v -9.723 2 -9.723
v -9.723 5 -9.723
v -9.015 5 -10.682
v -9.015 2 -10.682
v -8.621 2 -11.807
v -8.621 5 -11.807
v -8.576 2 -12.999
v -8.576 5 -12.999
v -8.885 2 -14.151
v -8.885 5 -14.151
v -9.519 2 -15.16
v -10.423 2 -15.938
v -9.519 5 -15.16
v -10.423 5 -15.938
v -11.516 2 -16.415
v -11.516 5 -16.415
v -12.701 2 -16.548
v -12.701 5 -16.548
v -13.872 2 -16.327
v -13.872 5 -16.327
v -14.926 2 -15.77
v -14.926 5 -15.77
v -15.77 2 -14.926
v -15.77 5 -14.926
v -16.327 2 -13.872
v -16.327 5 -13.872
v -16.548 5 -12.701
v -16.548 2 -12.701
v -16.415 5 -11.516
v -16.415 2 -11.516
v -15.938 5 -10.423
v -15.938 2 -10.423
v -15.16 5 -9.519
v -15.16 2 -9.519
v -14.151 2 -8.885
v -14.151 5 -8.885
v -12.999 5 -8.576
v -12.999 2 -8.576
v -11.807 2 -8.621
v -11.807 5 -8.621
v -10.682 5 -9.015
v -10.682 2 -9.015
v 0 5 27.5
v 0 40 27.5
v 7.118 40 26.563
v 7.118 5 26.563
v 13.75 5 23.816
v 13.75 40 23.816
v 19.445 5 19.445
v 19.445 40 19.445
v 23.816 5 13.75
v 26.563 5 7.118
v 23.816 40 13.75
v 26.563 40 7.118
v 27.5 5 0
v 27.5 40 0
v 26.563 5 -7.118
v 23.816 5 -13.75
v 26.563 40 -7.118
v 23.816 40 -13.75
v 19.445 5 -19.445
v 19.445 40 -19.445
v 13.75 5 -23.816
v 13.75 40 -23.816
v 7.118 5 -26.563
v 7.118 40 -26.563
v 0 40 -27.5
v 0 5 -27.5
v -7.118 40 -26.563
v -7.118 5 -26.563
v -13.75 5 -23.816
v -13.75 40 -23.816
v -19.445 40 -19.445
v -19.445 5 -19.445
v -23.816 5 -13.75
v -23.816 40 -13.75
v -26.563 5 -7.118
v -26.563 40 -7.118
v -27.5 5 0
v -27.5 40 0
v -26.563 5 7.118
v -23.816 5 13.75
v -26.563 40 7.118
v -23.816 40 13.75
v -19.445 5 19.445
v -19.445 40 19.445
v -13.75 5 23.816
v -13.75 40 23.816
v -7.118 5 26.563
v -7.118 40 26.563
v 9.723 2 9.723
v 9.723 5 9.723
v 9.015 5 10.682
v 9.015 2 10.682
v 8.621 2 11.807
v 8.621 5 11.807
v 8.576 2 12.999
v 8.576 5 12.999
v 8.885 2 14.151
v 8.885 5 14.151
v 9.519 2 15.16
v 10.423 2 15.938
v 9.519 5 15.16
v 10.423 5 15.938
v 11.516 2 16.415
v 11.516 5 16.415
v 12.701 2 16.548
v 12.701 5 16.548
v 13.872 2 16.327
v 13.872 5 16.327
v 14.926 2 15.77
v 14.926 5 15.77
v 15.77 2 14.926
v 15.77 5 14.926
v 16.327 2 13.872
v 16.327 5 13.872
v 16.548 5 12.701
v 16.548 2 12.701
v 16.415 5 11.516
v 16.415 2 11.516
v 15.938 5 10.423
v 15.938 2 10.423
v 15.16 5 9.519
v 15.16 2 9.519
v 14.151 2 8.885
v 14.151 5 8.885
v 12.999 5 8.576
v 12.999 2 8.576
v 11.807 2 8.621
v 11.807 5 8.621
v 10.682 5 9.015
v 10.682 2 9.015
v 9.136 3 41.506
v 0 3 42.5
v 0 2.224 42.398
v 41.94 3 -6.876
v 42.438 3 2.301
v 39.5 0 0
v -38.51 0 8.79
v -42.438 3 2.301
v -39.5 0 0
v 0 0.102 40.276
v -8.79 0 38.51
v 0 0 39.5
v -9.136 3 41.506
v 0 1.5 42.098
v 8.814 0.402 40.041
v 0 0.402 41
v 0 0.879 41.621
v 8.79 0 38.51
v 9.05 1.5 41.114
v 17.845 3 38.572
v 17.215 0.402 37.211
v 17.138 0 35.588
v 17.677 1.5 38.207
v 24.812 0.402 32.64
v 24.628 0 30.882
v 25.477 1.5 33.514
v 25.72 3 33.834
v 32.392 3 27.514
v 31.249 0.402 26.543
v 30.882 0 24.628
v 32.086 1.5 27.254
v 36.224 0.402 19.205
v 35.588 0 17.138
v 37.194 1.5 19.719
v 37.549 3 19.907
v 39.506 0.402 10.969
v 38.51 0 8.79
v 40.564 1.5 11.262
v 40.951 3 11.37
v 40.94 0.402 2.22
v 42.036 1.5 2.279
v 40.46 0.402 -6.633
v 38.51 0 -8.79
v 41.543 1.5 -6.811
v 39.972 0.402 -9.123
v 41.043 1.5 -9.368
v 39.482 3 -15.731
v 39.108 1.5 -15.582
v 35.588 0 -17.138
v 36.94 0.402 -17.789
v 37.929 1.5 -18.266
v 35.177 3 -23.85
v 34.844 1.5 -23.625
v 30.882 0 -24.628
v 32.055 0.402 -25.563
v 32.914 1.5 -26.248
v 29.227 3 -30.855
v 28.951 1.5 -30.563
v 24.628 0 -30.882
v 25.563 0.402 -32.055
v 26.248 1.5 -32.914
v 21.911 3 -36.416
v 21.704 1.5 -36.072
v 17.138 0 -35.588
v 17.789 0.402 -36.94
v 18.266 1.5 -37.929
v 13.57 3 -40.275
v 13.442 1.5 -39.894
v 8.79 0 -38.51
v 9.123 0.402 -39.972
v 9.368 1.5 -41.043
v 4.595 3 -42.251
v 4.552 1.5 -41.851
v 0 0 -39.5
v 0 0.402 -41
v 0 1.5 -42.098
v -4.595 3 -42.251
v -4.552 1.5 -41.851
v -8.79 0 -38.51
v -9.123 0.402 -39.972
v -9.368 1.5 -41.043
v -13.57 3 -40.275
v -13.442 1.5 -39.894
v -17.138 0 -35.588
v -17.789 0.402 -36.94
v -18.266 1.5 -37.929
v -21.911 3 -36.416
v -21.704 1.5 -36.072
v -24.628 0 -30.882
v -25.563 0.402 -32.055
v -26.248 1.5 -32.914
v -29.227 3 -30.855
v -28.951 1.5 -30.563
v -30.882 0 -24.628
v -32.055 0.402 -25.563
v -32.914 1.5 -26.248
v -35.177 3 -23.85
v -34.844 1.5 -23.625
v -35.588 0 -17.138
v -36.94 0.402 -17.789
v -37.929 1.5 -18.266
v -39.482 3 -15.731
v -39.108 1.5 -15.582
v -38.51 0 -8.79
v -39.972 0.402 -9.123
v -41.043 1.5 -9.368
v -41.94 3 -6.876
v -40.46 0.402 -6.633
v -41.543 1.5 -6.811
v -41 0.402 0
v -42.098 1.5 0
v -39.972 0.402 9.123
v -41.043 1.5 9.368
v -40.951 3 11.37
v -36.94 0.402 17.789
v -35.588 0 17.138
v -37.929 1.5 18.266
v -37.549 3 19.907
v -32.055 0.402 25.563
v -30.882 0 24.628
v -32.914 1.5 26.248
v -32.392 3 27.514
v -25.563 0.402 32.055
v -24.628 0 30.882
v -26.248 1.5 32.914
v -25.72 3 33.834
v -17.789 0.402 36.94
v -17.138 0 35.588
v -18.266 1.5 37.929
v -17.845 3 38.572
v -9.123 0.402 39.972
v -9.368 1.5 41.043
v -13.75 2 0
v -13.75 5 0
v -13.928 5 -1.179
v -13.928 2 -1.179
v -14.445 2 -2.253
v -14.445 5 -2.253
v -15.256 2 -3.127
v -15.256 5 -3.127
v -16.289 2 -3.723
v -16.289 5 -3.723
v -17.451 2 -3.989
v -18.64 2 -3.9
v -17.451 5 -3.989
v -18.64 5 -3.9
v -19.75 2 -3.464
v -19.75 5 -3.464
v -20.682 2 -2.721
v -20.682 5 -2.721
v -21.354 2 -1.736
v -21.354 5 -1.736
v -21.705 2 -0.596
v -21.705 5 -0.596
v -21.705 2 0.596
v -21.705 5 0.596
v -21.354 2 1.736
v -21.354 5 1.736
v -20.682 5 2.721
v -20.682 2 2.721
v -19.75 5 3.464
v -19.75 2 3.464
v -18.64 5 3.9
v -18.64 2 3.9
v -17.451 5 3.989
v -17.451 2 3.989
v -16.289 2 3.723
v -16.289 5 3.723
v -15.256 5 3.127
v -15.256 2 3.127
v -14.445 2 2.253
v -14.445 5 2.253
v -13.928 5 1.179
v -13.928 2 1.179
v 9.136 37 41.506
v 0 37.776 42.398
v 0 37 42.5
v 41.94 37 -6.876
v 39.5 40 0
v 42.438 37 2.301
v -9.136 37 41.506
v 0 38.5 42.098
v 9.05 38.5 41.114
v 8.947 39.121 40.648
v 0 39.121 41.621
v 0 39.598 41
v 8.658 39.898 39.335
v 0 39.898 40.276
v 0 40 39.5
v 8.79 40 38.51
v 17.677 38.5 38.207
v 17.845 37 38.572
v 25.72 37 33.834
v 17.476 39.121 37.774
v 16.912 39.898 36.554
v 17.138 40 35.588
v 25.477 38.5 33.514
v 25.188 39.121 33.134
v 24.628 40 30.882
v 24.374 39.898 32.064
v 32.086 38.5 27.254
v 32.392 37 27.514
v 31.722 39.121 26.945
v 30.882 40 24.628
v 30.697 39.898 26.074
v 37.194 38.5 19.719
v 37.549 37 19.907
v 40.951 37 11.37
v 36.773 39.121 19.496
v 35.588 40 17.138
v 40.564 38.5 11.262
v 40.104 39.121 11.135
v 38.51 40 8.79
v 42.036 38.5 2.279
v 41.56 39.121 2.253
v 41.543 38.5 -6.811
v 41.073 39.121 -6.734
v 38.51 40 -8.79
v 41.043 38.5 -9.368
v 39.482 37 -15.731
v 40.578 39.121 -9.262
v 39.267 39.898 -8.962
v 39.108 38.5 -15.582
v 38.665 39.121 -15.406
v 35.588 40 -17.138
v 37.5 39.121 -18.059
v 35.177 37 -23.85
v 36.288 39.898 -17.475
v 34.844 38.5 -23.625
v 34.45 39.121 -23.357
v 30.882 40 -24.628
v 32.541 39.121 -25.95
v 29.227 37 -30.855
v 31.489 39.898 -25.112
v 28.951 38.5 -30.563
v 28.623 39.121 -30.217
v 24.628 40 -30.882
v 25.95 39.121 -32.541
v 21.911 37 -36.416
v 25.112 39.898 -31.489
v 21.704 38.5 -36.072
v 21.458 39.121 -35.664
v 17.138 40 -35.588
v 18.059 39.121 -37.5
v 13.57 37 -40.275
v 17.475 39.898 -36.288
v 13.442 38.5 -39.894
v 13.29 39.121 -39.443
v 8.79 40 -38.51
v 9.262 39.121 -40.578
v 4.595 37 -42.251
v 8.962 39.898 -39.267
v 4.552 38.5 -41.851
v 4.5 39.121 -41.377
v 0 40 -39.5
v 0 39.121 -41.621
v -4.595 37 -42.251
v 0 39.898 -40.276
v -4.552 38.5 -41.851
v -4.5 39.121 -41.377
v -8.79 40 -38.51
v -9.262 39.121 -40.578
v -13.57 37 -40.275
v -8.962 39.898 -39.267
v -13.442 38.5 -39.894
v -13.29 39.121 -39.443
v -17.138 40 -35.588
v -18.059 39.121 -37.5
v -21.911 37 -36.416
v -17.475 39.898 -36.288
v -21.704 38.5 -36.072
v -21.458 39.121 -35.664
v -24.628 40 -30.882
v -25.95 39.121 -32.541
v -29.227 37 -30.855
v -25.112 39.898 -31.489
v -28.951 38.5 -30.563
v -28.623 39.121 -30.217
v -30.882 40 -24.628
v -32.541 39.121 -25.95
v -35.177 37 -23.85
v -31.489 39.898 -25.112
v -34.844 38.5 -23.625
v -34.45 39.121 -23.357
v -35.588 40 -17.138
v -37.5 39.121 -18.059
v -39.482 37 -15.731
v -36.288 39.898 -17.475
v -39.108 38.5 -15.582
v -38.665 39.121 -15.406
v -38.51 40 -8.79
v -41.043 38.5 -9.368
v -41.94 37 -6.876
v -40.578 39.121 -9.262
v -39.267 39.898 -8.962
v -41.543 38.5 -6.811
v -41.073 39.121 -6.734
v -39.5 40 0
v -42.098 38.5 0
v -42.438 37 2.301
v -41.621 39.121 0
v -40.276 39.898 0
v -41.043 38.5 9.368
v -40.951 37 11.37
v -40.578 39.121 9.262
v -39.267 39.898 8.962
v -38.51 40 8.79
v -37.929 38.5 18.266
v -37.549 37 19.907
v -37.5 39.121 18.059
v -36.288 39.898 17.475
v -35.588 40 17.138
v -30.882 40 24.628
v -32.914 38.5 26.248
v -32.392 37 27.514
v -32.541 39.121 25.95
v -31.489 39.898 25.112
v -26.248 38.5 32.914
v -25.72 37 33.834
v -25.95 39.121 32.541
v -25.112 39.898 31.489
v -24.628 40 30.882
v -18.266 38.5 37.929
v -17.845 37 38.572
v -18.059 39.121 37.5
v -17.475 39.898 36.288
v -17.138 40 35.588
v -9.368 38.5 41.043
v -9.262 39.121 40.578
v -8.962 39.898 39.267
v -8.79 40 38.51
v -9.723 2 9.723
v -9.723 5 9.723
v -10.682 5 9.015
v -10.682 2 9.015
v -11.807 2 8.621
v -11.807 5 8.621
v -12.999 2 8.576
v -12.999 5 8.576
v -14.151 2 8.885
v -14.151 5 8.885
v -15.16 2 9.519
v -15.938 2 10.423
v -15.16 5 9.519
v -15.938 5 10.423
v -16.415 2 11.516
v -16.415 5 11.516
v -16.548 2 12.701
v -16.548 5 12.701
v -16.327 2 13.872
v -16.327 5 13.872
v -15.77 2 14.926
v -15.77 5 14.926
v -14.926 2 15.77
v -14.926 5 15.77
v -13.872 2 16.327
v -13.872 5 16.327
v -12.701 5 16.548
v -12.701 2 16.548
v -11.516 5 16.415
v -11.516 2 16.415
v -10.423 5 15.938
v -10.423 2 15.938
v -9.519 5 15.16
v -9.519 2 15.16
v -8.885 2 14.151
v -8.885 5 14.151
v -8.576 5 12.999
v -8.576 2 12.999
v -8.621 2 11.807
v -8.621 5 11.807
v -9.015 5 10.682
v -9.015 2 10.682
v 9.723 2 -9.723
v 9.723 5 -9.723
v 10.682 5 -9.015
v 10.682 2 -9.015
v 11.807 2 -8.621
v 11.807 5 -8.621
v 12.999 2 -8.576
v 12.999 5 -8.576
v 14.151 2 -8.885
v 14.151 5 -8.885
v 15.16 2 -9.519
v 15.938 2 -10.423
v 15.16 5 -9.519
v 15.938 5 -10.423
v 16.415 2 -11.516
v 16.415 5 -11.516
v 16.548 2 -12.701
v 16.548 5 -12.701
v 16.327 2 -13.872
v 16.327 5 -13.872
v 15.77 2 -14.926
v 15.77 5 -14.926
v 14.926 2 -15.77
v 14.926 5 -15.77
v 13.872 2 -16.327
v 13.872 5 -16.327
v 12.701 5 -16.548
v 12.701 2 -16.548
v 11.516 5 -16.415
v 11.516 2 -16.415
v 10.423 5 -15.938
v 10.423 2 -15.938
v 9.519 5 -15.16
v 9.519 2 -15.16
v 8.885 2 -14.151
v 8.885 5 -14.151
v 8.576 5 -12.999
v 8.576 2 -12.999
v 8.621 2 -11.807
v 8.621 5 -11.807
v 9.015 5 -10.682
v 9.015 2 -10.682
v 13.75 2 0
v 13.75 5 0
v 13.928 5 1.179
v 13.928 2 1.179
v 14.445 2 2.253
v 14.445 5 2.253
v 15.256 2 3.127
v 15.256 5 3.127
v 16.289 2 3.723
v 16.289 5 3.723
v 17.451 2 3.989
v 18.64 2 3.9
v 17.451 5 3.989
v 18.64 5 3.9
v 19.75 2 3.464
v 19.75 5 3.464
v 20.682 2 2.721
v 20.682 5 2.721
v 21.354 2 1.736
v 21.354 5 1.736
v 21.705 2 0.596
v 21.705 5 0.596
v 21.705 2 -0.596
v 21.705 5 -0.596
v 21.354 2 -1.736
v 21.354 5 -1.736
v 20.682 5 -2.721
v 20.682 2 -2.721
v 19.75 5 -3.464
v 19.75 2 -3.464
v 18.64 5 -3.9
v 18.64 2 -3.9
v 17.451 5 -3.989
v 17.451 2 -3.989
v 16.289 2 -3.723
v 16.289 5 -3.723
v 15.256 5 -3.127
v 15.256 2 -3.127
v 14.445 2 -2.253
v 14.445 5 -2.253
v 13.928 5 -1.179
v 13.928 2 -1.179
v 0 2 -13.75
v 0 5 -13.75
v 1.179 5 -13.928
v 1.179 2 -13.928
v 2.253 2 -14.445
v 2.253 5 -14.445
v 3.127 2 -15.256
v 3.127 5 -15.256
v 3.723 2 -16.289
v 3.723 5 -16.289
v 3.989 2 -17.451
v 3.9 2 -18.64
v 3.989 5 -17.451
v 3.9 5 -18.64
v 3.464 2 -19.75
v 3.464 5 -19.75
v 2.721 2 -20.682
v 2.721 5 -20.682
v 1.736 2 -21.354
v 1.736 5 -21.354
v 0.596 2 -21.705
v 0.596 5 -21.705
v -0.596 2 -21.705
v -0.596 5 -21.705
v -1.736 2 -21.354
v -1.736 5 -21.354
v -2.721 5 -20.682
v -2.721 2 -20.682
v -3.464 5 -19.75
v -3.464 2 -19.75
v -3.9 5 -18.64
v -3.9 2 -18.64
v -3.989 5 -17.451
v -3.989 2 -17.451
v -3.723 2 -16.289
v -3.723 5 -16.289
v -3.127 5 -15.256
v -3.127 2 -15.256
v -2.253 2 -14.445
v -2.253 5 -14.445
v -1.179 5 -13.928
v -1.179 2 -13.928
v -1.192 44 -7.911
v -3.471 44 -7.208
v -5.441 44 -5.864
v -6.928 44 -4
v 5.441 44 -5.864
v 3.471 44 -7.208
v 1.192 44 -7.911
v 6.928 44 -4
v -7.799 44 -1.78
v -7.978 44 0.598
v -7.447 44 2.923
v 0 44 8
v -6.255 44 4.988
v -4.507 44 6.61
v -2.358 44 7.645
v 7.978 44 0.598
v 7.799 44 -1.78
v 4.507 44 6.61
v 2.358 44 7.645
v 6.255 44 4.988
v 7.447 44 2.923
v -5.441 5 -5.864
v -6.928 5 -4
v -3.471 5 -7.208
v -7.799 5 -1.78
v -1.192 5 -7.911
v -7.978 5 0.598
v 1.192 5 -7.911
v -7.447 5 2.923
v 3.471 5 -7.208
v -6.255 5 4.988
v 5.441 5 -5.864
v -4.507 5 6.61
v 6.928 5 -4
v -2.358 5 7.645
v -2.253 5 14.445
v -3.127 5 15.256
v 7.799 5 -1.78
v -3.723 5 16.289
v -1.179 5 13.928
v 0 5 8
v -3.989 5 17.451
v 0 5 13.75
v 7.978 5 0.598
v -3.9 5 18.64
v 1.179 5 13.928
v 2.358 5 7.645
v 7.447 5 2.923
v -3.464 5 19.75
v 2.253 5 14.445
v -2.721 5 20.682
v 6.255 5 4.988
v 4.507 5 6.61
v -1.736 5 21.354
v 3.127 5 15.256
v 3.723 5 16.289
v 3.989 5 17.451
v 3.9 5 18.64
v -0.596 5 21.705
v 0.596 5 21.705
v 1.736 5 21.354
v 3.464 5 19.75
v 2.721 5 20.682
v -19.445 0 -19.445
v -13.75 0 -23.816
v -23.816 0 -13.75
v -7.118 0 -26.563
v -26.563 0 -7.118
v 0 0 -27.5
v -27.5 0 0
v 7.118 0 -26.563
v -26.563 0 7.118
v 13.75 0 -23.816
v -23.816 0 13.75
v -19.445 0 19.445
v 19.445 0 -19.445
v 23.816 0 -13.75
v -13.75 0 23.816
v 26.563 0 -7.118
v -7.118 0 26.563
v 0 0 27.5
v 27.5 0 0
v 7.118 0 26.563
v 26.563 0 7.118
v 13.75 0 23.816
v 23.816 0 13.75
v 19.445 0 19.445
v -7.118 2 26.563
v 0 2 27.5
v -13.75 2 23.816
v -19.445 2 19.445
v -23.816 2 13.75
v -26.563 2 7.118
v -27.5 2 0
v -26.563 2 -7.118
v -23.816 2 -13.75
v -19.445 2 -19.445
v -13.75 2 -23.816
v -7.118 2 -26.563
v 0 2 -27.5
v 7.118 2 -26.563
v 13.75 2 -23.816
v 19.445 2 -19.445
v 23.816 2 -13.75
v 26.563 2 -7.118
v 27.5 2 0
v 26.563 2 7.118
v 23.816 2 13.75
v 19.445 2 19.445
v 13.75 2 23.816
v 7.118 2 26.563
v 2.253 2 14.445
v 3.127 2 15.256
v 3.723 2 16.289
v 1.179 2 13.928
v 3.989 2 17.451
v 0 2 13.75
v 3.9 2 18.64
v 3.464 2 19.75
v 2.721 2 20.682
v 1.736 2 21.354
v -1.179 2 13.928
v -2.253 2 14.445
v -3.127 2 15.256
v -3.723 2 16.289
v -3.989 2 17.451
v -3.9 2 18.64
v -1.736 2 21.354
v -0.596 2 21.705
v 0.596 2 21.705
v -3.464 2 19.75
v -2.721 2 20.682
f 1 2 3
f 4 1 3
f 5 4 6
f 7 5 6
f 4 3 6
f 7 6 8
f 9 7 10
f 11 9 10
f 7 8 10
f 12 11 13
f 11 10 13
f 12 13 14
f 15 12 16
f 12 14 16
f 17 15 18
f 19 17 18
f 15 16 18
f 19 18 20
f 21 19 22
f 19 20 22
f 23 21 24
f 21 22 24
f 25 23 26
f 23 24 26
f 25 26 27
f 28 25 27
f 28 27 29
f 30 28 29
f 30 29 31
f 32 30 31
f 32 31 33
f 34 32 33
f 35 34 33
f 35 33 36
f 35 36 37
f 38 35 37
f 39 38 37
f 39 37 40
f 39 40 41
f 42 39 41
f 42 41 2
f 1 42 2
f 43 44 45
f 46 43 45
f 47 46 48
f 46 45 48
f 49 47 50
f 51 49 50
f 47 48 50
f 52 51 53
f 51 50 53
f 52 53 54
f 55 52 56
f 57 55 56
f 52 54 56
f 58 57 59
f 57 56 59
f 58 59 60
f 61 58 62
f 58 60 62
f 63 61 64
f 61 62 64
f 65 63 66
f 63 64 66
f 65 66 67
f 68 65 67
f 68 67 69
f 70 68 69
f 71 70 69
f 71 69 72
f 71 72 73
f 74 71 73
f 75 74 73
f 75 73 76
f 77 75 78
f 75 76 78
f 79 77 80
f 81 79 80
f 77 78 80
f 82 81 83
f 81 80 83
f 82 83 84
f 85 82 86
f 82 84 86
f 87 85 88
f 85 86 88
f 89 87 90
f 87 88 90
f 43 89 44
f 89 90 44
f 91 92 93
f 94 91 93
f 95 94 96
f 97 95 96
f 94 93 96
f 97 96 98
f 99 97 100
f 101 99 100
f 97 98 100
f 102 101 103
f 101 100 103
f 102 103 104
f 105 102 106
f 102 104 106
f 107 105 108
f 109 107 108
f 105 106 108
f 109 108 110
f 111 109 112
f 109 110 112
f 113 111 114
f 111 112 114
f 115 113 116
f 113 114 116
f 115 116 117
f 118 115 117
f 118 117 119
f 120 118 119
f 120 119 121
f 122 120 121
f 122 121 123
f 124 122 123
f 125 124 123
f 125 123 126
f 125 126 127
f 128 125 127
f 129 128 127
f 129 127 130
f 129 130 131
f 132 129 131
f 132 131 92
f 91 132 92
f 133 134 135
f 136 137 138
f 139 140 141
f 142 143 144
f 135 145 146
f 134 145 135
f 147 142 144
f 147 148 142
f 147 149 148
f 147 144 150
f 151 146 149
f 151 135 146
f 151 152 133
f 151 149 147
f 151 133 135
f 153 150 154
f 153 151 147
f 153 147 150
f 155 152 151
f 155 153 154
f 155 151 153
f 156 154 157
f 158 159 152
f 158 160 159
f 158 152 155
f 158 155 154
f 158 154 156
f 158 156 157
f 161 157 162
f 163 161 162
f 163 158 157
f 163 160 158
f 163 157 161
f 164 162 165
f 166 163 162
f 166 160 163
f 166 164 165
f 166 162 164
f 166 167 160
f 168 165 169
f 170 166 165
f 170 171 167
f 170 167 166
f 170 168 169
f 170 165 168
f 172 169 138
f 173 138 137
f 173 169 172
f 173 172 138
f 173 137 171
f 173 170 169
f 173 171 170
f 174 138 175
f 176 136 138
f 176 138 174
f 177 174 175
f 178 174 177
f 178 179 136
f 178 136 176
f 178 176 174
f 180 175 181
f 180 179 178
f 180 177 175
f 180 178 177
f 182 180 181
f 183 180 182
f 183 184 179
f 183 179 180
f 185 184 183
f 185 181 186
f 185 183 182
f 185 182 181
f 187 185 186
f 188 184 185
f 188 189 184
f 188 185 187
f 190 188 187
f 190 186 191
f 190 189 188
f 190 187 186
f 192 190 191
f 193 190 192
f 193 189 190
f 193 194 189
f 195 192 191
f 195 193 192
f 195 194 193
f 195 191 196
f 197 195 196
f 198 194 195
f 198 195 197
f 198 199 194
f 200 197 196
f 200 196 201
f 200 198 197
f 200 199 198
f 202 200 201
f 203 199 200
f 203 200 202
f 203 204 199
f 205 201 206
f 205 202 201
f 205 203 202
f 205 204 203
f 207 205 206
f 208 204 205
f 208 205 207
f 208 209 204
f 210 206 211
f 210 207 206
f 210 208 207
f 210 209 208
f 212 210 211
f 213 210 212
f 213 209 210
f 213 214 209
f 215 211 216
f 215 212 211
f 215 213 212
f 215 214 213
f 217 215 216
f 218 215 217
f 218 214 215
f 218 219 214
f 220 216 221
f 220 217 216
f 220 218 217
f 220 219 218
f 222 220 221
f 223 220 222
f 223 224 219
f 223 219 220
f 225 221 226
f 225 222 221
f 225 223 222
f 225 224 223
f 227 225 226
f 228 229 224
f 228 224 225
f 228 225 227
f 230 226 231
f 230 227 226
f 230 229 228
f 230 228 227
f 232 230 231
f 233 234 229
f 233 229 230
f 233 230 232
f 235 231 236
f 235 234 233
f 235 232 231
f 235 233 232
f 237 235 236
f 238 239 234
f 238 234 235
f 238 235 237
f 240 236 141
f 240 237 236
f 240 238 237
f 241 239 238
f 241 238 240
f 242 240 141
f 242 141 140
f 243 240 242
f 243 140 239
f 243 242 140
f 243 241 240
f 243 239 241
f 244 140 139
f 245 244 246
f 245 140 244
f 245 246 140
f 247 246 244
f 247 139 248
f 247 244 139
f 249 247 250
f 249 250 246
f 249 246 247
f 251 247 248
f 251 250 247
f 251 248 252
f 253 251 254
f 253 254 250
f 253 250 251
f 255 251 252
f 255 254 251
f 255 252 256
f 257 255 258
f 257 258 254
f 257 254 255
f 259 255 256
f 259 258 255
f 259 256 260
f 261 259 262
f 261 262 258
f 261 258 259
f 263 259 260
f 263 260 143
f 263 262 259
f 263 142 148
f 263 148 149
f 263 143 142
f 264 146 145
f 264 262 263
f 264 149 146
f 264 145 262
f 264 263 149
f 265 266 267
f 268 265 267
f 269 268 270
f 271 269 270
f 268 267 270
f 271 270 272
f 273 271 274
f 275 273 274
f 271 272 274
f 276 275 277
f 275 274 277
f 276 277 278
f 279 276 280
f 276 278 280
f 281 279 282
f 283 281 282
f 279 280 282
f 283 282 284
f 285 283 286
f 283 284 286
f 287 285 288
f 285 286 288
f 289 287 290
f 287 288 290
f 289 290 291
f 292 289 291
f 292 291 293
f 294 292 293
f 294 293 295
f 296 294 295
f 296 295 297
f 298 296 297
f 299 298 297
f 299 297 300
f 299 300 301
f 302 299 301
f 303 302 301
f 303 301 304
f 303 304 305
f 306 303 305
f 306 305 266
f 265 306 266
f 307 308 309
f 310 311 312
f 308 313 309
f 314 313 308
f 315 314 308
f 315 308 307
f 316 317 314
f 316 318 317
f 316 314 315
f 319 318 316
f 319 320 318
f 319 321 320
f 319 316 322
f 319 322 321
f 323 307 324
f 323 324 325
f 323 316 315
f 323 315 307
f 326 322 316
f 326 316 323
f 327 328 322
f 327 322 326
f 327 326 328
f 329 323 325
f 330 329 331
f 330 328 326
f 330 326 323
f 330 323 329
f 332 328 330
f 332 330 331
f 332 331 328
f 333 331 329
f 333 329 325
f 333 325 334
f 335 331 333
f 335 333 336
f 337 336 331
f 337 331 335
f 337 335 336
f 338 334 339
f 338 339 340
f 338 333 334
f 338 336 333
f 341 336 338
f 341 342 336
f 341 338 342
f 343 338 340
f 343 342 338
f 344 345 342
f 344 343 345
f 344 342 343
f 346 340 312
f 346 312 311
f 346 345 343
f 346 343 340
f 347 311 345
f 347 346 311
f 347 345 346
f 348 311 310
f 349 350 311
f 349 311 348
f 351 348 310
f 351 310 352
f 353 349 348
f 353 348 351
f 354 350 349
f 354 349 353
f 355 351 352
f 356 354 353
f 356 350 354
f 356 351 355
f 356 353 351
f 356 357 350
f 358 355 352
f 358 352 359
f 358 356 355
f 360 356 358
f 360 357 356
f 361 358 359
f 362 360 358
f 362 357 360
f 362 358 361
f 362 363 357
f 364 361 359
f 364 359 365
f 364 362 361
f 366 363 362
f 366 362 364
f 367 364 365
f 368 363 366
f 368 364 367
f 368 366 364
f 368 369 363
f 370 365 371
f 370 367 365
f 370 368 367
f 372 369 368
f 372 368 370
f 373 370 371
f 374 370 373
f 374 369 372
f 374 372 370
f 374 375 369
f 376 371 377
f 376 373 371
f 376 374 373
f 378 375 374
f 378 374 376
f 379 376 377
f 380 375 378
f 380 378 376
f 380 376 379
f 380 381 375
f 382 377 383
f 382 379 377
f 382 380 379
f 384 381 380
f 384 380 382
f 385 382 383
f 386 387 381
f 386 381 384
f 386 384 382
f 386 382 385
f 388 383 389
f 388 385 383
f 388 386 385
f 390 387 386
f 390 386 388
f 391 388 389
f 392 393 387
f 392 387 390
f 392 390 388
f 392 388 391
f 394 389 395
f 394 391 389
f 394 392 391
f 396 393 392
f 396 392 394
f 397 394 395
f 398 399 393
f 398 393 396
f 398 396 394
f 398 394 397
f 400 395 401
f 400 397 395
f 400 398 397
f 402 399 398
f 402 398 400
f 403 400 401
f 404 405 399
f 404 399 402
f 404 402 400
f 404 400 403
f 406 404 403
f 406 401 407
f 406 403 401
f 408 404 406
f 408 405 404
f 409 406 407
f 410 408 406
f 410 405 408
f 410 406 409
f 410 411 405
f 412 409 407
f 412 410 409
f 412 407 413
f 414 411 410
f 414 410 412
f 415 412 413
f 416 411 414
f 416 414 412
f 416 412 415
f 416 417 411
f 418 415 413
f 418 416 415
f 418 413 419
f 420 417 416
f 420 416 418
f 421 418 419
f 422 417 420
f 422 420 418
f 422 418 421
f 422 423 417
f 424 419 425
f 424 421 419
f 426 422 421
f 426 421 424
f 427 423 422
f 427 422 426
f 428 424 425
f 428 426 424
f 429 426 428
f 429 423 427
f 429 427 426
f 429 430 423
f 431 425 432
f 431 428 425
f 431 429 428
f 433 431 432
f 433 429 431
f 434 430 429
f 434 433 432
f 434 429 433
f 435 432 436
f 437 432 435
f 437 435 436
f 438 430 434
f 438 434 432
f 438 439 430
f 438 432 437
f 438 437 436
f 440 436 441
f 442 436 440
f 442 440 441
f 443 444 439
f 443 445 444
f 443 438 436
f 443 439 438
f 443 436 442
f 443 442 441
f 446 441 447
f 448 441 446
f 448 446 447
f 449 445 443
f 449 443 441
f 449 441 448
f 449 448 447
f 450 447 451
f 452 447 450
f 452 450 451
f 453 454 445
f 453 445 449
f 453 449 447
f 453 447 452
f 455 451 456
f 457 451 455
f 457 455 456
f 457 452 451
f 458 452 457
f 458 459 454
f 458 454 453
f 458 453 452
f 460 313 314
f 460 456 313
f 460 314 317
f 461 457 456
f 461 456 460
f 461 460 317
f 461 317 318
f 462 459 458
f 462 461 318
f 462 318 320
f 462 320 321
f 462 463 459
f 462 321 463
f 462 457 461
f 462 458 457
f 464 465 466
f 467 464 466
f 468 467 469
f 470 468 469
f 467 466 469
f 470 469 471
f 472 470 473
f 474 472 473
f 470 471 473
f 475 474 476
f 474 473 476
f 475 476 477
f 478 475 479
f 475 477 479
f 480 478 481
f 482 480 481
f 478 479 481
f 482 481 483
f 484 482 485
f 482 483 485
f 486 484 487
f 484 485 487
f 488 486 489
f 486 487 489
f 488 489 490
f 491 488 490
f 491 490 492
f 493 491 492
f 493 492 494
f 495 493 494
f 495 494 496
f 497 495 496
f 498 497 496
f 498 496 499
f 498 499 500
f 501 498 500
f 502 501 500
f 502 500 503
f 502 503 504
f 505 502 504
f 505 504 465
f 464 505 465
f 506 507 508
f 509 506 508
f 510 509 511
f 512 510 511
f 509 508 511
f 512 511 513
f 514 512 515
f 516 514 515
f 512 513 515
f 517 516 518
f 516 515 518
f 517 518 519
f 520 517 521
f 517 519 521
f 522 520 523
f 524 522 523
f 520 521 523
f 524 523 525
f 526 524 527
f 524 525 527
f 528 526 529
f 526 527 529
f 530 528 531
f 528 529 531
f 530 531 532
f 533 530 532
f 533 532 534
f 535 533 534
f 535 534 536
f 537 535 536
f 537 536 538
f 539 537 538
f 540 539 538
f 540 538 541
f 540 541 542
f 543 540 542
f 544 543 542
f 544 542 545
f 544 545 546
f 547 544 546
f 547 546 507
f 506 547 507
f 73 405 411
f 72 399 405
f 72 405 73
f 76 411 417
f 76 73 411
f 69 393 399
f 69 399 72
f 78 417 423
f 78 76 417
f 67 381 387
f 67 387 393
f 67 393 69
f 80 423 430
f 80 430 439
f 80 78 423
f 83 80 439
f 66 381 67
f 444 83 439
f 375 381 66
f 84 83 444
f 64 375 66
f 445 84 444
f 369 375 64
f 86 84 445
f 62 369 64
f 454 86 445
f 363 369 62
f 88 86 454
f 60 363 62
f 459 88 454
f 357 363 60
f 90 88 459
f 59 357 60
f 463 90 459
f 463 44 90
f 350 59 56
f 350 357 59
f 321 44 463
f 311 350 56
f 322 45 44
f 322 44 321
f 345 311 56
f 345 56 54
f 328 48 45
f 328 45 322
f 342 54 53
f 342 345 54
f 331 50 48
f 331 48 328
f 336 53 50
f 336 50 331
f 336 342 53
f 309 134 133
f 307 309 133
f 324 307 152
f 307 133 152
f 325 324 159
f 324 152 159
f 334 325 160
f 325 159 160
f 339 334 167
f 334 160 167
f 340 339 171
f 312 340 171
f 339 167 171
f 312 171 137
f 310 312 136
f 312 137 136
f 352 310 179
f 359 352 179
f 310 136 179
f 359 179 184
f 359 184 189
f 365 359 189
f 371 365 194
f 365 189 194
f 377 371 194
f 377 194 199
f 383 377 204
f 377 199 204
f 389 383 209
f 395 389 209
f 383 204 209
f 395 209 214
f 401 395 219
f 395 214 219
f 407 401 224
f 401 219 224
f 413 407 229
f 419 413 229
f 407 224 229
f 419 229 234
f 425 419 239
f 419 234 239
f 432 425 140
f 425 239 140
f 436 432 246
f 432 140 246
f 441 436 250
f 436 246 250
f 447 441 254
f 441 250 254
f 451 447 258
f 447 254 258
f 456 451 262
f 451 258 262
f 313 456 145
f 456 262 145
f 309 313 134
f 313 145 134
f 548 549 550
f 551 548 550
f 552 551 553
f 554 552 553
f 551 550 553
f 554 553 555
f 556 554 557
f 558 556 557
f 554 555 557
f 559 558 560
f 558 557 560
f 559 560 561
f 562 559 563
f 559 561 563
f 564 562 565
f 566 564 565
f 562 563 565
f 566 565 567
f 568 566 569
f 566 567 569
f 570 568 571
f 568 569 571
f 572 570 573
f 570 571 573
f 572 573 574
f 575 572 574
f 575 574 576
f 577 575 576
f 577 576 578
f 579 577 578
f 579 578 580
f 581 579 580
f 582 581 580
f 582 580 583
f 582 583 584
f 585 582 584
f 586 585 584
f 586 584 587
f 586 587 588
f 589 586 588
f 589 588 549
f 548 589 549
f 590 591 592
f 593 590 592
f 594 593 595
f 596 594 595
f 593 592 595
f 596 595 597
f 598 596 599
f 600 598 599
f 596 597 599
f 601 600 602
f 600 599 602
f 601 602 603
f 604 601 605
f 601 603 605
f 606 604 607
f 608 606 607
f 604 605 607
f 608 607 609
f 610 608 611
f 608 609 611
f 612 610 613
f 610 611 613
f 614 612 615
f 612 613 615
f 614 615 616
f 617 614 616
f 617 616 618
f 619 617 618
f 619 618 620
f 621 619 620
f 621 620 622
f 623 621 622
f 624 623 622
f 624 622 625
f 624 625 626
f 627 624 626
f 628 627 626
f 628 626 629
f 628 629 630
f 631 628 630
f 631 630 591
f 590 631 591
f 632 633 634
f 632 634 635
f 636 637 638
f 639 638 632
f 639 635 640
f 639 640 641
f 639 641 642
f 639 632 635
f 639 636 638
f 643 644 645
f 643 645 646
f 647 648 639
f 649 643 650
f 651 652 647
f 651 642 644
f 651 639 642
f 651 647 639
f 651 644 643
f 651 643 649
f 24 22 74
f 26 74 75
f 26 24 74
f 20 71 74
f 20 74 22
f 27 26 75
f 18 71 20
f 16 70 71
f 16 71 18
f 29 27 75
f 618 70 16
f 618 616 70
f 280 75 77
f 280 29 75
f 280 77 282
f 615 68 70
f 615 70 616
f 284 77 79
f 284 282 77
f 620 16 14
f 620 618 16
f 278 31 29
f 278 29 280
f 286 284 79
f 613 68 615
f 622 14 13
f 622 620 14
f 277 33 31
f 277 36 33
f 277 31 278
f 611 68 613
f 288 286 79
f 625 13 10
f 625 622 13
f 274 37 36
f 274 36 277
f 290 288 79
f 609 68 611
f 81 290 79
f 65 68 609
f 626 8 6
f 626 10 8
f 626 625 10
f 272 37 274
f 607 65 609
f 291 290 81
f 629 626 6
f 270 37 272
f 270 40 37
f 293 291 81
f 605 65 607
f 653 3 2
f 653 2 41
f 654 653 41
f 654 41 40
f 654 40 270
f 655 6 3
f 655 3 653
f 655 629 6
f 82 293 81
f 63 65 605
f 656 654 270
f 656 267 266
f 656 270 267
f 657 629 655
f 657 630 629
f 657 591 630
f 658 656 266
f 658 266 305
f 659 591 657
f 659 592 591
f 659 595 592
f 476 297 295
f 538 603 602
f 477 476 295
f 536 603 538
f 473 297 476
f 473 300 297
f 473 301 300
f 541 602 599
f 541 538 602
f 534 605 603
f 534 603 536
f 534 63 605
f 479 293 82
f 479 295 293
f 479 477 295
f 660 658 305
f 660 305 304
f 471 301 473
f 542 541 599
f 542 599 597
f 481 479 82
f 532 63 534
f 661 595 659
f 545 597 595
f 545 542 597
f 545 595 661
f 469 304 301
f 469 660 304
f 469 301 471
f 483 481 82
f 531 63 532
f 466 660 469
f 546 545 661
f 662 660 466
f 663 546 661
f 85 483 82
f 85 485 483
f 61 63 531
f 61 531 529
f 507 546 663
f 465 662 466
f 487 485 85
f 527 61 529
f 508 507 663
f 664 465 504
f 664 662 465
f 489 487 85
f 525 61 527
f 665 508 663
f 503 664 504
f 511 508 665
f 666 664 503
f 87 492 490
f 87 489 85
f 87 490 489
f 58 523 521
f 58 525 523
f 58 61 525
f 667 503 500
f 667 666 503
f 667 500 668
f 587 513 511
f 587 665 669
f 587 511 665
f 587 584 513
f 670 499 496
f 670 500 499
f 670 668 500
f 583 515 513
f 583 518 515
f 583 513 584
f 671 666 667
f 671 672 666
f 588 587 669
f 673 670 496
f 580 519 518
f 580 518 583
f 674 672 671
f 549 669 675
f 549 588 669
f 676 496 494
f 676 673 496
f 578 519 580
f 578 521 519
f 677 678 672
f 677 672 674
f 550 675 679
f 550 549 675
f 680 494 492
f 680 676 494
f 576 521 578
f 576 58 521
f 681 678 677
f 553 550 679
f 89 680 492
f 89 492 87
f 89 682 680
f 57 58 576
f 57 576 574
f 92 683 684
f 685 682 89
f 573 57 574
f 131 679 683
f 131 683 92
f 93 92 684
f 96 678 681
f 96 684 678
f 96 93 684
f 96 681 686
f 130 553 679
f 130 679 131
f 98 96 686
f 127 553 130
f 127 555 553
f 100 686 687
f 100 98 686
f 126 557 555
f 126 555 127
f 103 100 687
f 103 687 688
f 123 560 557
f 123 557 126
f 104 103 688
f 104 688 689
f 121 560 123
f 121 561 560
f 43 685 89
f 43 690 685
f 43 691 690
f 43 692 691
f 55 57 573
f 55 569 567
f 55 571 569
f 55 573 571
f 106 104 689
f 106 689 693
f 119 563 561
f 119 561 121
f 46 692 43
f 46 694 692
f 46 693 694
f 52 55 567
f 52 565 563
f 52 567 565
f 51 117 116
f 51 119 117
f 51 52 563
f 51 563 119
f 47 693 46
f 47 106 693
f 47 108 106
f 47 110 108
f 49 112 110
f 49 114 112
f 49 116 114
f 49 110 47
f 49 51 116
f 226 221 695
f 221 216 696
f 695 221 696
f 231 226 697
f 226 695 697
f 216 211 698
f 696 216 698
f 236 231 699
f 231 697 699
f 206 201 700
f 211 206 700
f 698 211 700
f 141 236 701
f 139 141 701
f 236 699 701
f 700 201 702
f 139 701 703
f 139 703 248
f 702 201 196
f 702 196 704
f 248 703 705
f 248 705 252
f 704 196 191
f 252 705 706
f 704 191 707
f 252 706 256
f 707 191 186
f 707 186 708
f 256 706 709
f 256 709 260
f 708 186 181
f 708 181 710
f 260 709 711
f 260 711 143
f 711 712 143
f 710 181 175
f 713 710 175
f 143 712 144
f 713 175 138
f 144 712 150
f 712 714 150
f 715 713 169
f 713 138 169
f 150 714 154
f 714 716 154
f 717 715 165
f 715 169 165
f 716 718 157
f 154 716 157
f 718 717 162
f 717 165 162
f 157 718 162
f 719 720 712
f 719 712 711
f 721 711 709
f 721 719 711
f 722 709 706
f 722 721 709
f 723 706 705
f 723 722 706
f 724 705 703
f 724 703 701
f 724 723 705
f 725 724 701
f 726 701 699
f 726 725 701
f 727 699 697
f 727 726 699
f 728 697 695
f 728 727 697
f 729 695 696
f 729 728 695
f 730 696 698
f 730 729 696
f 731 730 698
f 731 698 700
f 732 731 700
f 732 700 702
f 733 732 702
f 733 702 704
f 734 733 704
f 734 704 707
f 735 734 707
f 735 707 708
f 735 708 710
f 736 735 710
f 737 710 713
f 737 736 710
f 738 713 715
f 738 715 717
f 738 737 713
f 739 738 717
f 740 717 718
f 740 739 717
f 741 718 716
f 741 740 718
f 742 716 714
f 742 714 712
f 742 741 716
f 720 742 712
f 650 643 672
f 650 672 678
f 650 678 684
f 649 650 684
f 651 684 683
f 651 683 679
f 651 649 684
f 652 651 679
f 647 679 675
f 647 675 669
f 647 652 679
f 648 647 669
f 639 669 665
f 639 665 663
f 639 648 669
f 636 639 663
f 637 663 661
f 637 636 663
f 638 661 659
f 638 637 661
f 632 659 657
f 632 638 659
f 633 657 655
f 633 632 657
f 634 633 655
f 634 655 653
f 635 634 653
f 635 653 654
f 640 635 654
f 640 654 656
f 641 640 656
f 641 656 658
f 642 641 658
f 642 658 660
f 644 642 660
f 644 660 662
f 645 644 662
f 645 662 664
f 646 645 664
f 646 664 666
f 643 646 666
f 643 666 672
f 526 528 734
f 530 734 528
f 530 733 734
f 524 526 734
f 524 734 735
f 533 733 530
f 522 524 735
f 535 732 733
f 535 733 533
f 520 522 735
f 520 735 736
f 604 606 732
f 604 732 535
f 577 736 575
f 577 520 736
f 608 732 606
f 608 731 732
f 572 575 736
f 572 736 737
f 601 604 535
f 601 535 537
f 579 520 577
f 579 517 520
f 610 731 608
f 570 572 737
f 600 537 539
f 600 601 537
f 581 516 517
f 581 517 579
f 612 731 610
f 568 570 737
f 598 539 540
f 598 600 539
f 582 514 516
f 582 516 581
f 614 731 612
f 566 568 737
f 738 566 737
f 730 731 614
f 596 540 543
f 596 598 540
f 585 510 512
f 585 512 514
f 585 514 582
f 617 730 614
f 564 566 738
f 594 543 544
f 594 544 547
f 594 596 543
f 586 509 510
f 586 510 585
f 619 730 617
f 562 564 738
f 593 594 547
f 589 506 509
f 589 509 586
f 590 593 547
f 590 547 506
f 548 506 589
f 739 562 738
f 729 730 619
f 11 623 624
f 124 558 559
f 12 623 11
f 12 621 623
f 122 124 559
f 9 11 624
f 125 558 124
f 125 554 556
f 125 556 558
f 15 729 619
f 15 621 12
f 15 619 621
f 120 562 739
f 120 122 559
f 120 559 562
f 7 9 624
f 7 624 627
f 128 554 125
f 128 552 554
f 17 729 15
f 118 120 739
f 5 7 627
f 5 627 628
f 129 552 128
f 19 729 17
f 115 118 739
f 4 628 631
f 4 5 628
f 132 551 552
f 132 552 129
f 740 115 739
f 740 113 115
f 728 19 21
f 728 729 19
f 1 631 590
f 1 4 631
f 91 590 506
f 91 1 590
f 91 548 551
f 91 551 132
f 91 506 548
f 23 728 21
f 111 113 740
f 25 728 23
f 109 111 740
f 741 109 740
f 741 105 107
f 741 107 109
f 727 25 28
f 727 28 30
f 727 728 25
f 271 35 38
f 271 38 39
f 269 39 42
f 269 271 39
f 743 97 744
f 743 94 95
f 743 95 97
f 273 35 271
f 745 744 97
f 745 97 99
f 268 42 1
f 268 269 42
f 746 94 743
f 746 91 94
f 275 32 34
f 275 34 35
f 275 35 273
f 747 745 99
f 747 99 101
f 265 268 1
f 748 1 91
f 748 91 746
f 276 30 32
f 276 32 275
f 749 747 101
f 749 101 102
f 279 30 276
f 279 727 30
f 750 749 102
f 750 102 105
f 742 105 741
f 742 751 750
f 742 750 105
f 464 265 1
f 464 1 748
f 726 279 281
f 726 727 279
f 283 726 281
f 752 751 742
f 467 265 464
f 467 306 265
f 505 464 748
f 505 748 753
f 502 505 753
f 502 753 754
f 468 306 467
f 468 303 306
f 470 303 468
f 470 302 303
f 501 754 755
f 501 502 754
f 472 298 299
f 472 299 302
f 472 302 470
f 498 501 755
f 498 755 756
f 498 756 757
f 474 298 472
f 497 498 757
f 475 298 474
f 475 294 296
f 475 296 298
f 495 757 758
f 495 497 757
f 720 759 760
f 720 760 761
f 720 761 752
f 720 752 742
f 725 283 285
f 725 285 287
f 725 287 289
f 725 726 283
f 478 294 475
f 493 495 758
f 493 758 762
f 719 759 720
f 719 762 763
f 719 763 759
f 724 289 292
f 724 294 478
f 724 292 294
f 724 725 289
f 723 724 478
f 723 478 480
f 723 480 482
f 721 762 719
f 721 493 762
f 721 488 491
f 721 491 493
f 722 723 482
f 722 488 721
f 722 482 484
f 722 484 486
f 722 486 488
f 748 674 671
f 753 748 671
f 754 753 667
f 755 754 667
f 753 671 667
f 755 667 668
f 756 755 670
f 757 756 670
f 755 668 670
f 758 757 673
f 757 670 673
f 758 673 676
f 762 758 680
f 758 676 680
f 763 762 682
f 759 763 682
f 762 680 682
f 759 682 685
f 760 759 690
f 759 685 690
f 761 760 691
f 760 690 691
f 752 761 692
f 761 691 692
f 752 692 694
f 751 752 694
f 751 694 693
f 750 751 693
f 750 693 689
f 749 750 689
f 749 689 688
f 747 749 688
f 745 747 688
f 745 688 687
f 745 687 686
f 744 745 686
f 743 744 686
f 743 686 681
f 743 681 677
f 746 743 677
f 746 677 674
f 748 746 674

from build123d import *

# Parameters (mm, degrees)
SKETCH_1_R               = 42.5
EXTRUDE_1_DEPTH          = 40
SKETCH_2_R               = 27.5
SKETCH_2_R_2             = 8
CUT_EXTRUDE_1_DEPTH      = 35
SKETCH_3_R               = 4
CUT_EXTRUDE_2_DEPTH      = 35
PATTERN_CIRCULAR_1_COUNT = 8
CUT_EXTRUDE_START        = -2
SKETCH_4_R               = 27.5
CUT_EXTRUDE_3_DEPTH      = 2
EXTRUDE_START            = 4
SKETCH_5_R               = 8
EXTRUDE_2_DEPTH          = 4
FILLET_1_R               = 3


with BuildPart() as part:
    # Эскиз1 → Бобышка-Вытянуть1 (new body)
    with BuildSketch(Plane(origin=(0, 0, 0), x_dir=(1, 0, 0), z_dir=(0, 1, 0))):
        with Locations(Location((0, 0, 0), (0, 0, 270))):
            Circle(SKETCH_1_R)
    extrude(amount=EXTRUDE_1_DEPTH)

    # Эскиз2 → Вырез-Вытянуть1 (cut)
    with BuildSketch(Plane(origin=(0, 40, 0), x_dir=(1, 0, 0), z_dir=(0, 1, 0))):
        with Locations(Location((0, 0, 0), (0, 0, 270))):
            Circle(SKETCH_2_R)
        with Locations(Location((0, 0, 0), (0, 0, 270))):
            Circle(SKETCH_2_R_2, mode=Mode.SUBTRACT)
    extrude(amount=-CUT_EXTRUDE_1_DEPTH, mode=Mode.SUBTRACT)

    # Эскиз3 → Вырез-Вытянуть2 (cut)
    with BuildSketch(Plane(origin=(0, 5, 0), x_dir=(1, 0, 0), z_dir=(0, 1, 0))):
        with Locations(Location((0, 17.75, 0), (0, 0, 270))):
            Circle(SKETCH_3_R)
    cut_extrude_2 = extrude(amount=-CUT_EXTRUDE_2_DEPTH, mode=Mode.SUBTRACT)

    # Круговой массив1: Вырез-Вытянуть2 ×8 about axis
    pattern_circular_1_axis = Axis((0, 0, 0), (0, 1, 0))
    for i in range(1, PATTERN_CIRCULAR_1_COUNT):
        add(cut_extrude_2.rotate(pattern_circular_1_axis, i * 360 / PATTERN_CIRCULAR_1_COUNT), mode=Mode.SUBTRACT)

    # Эскиз4 → Вырез-Вытянуть3 (cut)
    with BuildSketch(Plane.XZ.offset(CUT_EXTRUDE_START)):
        with Locations(Location((0, 0, 0), (0, 0, 90))):
            Circle(SKETCH_4_R)
    extrude(amount=CUT_EXTRUDE_3_DEPTH, mode=Mode.SUBTRACT)

    # Эскиз5 → Бобышка-Вытянуть2 (add)
    with BuildSketch(Plane(origin=(0, 40, 0), x_dir=(1, 0, 0), z_dir=(0, 1, 0)).offset(EXTRUDE_START)):
        with Locations(Location((0, 0, 0), (0, 0, 270))):
            Circle(SKETCH_5_R)
    extrude(amount=-EXTRUDE_2_DEPTH)

    # Скругление1
    fillet_1_edges = [part.edges().sort_by_distance(p)[0] for p in [
        (0, 0, -42.5),
        (0, 40, -42.5),
    ]]
    fillet(fillet_1_edges, radius=FILLET_1_R)


solid = part.part
